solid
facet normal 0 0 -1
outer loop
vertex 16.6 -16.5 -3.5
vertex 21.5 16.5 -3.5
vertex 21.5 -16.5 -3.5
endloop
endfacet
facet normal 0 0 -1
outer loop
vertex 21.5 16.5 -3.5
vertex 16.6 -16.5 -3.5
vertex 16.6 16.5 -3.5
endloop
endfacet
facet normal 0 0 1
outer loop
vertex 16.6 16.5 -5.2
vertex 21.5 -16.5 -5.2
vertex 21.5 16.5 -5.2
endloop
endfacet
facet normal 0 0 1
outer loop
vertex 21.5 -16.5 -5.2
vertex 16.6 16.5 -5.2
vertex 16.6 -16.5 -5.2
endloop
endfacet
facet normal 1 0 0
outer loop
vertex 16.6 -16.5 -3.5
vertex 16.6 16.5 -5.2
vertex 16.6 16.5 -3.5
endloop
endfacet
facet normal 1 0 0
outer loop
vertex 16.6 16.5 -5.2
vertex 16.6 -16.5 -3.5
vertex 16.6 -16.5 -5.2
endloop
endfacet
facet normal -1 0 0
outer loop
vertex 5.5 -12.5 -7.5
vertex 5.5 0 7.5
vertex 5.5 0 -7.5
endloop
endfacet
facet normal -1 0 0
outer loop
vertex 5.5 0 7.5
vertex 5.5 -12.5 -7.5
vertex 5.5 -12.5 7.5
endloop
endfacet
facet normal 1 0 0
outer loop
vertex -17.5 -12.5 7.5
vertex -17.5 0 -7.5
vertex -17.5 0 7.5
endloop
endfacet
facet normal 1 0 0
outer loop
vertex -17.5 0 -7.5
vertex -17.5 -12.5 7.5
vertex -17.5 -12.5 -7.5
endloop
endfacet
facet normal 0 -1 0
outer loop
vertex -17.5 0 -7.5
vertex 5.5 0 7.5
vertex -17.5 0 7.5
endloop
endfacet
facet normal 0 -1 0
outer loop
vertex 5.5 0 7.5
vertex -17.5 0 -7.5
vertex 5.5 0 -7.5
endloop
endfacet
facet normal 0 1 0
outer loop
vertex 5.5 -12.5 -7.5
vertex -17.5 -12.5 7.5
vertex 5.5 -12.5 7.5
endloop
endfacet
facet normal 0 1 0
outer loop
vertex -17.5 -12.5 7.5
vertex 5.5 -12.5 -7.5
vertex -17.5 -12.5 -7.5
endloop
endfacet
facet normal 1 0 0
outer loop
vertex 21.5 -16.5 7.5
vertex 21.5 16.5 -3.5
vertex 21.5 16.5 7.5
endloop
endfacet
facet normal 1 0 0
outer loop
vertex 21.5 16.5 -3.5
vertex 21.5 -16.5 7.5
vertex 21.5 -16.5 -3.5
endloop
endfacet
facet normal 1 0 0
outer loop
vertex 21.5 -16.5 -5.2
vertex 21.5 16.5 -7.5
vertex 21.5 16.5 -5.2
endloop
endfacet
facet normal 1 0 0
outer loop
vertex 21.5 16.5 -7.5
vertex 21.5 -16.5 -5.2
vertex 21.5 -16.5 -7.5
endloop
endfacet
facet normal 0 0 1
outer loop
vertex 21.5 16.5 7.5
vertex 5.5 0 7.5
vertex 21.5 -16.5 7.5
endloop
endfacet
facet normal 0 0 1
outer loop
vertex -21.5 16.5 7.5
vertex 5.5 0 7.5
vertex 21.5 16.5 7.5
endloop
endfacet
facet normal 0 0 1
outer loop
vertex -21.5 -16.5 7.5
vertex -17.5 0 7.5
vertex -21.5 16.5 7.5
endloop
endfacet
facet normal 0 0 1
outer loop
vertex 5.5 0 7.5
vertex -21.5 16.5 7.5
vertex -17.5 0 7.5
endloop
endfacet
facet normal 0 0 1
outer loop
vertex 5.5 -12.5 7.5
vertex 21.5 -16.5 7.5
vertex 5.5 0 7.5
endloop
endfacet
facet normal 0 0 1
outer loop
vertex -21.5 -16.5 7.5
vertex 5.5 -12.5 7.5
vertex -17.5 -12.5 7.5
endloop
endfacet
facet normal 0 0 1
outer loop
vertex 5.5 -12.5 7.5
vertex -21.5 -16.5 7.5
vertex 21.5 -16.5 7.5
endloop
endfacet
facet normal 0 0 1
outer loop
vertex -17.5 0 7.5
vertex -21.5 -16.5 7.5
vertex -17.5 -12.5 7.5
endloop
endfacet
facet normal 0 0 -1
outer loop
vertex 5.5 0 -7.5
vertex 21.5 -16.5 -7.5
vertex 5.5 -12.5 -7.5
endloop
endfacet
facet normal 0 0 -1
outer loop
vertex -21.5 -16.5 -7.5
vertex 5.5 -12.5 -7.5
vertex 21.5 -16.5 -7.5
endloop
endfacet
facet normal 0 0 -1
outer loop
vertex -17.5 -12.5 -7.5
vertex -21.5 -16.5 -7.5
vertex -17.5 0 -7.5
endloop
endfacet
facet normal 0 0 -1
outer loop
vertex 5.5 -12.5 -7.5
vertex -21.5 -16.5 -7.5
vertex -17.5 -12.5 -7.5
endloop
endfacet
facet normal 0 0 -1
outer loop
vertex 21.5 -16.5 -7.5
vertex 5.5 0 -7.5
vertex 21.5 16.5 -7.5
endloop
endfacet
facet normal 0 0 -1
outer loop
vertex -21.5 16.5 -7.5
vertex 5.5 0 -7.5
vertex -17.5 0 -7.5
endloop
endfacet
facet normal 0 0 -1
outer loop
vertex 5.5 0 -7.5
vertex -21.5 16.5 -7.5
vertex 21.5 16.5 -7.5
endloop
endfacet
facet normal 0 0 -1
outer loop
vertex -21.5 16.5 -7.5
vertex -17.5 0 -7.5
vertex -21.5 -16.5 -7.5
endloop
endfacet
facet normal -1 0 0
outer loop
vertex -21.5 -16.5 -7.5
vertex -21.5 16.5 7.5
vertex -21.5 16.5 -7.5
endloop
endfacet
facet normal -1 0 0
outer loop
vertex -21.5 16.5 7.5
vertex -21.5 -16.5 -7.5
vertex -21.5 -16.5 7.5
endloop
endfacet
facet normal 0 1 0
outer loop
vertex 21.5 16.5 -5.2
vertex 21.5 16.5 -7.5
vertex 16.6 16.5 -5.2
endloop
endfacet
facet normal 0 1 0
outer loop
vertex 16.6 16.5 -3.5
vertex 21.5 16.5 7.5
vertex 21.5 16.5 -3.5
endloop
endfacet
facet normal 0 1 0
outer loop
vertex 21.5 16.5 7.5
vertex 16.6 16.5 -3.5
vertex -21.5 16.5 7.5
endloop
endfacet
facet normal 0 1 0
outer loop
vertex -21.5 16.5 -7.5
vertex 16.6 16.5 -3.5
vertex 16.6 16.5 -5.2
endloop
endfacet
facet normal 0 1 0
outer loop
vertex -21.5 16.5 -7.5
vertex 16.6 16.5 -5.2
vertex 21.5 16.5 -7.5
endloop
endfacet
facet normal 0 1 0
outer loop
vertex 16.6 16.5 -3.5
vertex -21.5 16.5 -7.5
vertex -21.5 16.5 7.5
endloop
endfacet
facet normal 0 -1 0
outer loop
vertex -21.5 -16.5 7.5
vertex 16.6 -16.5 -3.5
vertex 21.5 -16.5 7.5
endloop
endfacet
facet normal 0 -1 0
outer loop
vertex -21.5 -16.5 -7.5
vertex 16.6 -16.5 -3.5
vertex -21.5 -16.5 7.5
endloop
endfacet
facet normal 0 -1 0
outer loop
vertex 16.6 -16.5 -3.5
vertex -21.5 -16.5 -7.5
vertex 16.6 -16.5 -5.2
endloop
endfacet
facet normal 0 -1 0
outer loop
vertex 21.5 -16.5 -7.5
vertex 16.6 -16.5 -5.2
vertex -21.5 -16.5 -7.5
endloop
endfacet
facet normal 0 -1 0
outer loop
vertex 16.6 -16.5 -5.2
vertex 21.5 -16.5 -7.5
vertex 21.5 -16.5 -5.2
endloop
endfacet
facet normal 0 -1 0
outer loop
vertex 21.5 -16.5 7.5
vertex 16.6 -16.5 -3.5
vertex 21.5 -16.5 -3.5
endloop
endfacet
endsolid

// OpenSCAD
//
// Block to hold LEDs and servo
//
//

h = 15;
th = 1.7;
w = 43;
wy = 33;
wc = 5;
ser_x = 23;
ser_y = 12.5;

module pre()
{
    cube([w, wy, h], center=true);
}

module rem()
{
    translate([w/2-wc/2+0.1, 0, h/2-th/2-11])
    cube([5, 40, th], center=true);

    translate([-w/2+ser_x/2+4, -wy/2+ser_y/2+4, 0])
    cube([ser_x, ser_y, 50], center=true);
}

module block()
{
    difference()
    {
        pre();
        rem();
    }
}


block();
